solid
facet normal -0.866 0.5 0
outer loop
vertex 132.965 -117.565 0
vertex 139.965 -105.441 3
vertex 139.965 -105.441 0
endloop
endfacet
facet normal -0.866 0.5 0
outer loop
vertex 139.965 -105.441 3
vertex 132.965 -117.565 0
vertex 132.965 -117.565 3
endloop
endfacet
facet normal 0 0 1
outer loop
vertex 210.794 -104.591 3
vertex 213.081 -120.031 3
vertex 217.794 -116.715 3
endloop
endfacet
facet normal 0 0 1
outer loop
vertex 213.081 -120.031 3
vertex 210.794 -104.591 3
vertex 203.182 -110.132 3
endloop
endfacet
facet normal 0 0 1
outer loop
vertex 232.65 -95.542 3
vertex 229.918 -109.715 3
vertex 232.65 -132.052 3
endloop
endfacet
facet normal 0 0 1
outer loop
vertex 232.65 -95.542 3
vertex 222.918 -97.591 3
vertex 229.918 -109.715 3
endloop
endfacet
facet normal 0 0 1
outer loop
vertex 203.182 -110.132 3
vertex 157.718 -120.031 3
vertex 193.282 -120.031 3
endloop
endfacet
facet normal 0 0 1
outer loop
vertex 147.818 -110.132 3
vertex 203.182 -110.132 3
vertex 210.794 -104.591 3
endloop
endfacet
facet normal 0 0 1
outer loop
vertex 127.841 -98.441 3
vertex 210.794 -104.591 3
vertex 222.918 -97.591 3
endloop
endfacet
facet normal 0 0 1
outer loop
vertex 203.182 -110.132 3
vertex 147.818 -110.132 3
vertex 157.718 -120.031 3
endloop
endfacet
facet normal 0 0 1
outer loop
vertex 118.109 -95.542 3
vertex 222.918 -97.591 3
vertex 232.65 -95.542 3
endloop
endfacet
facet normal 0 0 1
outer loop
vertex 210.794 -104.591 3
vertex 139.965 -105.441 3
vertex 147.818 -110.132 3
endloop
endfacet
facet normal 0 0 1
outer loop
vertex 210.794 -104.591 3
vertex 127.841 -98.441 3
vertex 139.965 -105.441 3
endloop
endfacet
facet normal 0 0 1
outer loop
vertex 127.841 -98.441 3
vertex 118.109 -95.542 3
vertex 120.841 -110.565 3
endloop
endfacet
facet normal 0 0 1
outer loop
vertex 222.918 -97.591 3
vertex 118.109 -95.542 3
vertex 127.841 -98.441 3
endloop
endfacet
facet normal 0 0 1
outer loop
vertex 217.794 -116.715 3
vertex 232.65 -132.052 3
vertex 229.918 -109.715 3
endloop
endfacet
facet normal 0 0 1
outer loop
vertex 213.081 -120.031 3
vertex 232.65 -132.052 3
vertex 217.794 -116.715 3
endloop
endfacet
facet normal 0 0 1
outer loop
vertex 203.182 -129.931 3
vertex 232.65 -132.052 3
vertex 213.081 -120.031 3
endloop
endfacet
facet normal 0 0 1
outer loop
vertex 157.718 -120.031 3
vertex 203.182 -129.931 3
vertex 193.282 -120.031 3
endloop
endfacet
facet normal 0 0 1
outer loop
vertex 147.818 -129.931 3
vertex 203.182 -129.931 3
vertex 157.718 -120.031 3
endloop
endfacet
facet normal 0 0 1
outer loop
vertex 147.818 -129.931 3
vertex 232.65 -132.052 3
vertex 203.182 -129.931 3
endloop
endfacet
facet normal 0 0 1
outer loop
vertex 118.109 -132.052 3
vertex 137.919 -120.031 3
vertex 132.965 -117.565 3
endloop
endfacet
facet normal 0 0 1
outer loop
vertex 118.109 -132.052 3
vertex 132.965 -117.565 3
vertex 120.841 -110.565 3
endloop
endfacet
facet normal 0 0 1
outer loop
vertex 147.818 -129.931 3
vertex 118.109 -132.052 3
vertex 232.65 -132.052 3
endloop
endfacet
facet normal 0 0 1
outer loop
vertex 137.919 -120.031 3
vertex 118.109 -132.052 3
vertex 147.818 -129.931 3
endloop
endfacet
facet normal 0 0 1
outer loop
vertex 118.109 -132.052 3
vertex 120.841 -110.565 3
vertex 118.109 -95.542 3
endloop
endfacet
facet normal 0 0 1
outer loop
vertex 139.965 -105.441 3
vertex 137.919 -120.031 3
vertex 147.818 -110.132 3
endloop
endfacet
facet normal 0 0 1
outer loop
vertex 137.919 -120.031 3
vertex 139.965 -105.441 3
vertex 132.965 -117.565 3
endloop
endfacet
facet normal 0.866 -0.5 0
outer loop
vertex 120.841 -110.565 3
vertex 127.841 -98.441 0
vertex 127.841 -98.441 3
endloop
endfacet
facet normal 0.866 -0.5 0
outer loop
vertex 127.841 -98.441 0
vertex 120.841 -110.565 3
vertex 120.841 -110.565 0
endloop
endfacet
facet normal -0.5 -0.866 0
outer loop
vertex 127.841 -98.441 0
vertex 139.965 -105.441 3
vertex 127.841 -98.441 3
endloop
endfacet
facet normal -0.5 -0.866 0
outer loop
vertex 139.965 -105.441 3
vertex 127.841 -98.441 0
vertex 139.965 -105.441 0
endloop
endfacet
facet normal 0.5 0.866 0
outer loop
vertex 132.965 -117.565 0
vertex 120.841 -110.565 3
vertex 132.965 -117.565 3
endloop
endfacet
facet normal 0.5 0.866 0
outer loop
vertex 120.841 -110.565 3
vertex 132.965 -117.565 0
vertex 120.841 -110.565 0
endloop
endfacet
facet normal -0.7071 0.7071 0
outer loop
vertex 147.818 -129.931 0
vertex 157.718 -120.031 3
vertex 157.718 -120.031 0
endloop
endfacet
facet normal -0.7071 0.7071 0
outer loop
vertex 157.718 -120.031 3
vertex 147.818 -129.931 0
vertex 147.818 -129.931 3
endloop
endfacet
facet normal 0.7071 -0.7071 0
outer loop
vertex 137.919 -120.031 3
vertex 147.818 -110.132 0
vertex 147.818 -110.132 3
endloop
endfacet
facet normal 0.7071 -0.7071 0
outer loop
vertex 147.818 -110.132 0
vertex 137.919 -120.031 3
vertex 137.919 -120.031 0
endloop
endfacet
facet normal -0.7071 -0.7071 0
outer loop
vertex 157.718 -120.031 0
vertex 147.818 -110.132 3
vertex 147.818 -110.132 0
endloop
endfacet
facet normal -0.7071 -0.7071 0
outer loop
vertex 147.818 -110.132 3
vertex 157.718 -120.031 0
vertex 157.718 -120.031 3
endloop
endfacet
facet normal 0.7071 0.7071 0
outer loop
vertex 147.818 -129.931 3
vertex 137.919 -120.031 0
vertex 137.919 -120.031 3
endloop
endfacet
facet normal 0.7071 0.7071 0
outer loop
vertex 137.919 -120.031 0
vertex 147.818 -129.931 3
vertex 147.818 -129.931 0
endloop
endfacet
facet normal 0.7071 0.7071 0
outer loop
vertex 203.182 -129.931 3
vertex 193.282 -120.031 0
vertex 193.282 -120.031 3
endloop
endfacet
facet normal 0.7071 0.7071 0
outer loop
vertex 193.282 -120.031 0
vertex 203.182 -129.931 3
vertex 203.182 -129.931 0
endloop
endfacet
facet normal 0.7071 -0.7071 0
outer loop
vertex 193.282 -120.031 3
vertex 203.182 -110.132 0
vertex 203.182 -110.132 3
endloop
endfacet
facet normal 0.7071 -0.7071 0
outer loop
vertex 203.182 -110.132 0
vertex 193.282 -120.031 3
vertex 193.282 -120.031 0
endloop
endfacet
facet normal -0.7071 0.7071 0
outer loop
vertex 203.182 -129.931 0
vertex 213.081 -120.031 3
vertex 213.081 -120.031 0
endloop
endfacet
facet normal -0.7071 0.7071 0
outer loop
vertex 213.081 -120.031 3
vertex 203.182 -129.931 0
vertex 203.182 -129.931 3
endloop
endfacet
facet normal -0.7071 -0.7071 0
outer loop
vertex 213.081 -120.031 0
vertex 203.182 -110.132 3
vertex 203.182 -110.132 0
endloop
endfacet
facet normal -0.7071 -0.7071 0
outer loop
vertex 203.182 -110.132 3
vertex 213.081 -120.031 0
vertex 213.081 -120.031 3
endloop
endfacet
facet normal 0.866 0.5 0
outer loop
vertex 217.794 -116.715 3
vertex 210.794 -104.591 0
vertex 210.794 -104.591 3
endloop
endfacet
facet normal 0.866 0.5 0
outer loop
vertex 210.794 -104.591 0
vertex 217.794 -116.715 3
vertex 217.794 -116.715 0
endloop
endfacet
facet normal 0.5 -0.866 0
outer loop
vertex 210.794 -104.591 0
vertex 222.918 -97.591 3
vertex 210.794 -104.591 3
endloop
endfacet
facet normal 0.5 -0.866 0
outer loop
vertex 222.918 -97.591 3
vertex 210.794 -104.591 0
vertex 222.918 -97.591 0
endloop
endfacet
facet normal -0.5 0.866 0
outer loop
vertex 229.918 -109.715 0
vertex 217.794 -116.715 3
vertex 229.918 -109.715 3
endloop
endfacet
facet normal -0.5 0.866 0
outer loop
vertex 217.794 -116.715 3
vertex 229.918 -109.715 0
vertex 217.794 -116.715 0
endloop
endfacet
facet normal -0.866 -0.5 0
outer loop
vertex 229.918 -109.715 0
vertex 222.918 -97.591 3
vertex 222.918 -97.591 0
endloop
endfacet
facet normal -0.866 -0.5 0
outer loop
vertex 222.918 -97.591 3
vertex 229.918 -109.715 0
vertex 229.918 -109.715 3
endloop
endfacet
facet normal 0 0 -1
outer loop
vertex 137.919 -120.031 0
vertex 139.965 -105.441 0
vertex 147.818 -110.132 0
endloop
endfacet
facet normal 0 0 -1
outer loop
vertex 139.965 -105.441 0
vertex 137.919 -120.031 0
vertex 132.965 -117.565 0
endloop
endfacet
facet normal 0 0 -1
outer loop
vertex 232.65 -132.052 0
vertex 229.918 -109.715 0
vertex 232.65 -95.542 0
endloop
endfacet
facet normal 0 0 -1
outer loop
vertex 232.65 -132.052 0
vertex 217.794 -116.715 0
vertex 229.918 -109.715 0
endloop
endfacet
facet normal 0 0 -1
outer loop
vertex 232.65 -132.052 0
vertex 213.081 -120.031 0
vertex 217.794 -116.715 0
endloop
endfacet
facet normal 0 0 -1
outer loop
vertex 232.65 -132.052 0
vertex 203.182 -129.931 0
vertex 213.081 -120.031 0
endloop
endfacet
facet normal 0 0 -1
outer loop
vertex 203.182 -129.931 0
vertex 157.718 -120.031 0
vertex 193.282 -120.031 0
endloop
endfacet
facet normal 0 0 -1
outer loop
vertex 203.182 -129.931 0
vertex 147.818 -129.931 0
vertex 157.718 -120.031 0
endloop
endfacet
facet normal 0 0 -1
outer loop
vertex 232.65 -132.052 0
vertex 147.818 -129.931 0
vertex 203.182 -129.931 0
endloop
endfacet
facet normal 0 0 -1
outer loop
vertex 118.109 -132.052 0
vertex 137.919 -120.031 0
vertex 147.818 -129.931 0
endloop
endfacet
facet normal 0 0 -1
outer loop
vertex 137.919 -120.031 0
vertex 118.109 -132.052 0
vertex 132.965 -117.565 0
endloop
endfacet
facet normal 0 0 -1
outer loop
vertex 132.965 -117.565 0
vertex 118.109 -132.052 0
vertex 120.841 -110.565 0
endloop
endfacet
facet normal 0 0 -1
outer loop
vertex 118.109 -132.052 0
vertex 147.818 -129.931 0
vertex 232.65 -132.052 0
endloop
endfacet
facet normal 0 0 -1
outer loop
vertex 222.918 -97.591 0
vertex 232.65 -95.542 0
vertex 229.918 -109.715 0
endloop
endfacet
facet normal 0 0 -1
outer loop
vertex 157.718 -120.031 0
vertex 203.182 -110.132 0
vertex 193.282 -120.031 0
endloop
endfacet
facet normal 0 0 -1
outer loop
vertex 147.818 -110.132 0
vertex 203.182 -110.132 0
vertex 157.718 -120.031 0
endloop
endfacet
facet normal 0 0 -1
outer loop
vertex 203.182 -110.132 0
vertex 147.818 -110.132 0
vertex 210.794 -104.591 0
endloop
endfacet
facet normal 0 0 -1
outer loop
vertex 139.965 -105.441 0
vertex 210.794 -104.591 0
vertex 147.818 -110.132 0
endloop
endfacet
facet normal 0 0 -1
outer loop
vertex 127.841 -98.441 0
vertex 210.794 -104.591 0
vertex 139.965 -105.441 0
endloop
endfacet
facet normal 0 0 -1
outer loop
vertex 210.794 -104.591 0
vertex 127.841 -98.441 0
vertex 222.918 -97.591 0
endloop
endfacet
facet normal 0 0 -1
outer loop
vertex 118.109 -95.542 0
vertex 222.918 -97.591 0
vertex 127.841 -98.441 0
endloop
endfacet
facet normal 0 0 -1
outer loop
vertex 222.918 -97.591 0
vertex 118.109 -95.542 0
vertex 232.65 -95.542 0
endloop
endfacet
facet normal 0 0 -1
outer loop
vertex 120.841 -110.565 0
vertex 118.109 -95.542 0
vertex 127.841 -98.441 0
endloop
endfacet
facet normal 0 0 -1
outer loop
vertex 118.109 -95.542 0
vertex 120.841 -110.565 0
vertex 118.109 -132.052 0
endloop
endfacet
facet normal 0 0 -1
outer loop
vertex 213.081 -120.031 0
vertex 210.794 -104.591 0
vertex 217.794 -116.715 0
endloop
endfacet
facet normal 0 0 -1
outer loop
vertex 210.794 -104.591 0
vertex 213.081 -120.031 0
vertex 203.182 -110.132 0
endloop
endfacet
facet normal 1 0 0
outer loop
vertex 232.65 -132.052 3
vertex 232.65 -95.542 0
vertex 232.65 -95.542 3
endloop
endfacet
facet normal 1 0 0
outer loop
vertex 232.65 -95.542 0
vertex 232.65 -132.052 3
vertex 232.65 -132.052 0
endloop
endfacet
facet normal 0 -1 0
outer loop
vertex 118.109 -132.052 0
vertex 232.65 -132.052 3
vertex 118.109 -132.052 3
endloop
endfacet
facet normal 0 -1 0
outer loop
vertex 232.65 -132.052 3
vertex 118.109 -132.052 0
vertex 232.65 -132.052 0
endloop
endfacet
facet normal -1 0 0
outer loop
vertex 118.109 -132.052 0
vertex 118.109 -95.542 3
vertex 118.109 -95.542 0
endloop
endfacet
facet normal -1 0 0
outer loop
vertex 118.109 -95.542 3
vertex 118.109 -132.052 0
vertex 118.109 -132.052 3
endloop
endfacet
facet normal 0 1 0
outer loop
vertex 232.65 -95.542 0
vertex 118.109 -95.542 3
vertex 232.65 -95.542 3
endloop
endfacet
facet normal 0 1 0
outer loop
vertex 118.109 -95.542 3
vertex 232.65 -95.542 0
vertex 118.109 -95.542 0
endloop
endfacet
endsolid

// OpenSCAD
$fn = $preview ? 0 : 100;


difference(){
	difference() {
		union() {
			linear_extrude(height = 3) {
				polygon(points = [[118.108845726812, -132.05203820042829], [232.64999999999998, -132.05203820042829], [232.64999999999998, -95.54163522034969], [118.108845726812, -95.54163522034969], [118.108845726812, -132.05203820042829]]);
			}
		}
	}
	/* Holes Below*/
	union(){
		translate(v = [130.4030743609, -108.0028511525, 0]) {
			rotate(a = -30) {
				cube(center = true, size = [14, 14, 6]);
			}
		}
		translate(v = [147.8183766184, -120.0312229203, 0]) {
			rotate(a = -45) {
				cube(center = true, size = [14, 14, 6]);
			}
		}
		translate(v = [203.1816233816, -120.0312229203, 0]) {
			rotate(a = 45) {
				cube(center = true, size = [14, 14, 6]);
			}
		}
		translate(v = [220.3557713659, -107.1528511525, 0]) {
			rotate(a = 30) {
				cube(center = true, size = [14, 14, 6]);
			}
		}
	} /* End Holes */ 
}
